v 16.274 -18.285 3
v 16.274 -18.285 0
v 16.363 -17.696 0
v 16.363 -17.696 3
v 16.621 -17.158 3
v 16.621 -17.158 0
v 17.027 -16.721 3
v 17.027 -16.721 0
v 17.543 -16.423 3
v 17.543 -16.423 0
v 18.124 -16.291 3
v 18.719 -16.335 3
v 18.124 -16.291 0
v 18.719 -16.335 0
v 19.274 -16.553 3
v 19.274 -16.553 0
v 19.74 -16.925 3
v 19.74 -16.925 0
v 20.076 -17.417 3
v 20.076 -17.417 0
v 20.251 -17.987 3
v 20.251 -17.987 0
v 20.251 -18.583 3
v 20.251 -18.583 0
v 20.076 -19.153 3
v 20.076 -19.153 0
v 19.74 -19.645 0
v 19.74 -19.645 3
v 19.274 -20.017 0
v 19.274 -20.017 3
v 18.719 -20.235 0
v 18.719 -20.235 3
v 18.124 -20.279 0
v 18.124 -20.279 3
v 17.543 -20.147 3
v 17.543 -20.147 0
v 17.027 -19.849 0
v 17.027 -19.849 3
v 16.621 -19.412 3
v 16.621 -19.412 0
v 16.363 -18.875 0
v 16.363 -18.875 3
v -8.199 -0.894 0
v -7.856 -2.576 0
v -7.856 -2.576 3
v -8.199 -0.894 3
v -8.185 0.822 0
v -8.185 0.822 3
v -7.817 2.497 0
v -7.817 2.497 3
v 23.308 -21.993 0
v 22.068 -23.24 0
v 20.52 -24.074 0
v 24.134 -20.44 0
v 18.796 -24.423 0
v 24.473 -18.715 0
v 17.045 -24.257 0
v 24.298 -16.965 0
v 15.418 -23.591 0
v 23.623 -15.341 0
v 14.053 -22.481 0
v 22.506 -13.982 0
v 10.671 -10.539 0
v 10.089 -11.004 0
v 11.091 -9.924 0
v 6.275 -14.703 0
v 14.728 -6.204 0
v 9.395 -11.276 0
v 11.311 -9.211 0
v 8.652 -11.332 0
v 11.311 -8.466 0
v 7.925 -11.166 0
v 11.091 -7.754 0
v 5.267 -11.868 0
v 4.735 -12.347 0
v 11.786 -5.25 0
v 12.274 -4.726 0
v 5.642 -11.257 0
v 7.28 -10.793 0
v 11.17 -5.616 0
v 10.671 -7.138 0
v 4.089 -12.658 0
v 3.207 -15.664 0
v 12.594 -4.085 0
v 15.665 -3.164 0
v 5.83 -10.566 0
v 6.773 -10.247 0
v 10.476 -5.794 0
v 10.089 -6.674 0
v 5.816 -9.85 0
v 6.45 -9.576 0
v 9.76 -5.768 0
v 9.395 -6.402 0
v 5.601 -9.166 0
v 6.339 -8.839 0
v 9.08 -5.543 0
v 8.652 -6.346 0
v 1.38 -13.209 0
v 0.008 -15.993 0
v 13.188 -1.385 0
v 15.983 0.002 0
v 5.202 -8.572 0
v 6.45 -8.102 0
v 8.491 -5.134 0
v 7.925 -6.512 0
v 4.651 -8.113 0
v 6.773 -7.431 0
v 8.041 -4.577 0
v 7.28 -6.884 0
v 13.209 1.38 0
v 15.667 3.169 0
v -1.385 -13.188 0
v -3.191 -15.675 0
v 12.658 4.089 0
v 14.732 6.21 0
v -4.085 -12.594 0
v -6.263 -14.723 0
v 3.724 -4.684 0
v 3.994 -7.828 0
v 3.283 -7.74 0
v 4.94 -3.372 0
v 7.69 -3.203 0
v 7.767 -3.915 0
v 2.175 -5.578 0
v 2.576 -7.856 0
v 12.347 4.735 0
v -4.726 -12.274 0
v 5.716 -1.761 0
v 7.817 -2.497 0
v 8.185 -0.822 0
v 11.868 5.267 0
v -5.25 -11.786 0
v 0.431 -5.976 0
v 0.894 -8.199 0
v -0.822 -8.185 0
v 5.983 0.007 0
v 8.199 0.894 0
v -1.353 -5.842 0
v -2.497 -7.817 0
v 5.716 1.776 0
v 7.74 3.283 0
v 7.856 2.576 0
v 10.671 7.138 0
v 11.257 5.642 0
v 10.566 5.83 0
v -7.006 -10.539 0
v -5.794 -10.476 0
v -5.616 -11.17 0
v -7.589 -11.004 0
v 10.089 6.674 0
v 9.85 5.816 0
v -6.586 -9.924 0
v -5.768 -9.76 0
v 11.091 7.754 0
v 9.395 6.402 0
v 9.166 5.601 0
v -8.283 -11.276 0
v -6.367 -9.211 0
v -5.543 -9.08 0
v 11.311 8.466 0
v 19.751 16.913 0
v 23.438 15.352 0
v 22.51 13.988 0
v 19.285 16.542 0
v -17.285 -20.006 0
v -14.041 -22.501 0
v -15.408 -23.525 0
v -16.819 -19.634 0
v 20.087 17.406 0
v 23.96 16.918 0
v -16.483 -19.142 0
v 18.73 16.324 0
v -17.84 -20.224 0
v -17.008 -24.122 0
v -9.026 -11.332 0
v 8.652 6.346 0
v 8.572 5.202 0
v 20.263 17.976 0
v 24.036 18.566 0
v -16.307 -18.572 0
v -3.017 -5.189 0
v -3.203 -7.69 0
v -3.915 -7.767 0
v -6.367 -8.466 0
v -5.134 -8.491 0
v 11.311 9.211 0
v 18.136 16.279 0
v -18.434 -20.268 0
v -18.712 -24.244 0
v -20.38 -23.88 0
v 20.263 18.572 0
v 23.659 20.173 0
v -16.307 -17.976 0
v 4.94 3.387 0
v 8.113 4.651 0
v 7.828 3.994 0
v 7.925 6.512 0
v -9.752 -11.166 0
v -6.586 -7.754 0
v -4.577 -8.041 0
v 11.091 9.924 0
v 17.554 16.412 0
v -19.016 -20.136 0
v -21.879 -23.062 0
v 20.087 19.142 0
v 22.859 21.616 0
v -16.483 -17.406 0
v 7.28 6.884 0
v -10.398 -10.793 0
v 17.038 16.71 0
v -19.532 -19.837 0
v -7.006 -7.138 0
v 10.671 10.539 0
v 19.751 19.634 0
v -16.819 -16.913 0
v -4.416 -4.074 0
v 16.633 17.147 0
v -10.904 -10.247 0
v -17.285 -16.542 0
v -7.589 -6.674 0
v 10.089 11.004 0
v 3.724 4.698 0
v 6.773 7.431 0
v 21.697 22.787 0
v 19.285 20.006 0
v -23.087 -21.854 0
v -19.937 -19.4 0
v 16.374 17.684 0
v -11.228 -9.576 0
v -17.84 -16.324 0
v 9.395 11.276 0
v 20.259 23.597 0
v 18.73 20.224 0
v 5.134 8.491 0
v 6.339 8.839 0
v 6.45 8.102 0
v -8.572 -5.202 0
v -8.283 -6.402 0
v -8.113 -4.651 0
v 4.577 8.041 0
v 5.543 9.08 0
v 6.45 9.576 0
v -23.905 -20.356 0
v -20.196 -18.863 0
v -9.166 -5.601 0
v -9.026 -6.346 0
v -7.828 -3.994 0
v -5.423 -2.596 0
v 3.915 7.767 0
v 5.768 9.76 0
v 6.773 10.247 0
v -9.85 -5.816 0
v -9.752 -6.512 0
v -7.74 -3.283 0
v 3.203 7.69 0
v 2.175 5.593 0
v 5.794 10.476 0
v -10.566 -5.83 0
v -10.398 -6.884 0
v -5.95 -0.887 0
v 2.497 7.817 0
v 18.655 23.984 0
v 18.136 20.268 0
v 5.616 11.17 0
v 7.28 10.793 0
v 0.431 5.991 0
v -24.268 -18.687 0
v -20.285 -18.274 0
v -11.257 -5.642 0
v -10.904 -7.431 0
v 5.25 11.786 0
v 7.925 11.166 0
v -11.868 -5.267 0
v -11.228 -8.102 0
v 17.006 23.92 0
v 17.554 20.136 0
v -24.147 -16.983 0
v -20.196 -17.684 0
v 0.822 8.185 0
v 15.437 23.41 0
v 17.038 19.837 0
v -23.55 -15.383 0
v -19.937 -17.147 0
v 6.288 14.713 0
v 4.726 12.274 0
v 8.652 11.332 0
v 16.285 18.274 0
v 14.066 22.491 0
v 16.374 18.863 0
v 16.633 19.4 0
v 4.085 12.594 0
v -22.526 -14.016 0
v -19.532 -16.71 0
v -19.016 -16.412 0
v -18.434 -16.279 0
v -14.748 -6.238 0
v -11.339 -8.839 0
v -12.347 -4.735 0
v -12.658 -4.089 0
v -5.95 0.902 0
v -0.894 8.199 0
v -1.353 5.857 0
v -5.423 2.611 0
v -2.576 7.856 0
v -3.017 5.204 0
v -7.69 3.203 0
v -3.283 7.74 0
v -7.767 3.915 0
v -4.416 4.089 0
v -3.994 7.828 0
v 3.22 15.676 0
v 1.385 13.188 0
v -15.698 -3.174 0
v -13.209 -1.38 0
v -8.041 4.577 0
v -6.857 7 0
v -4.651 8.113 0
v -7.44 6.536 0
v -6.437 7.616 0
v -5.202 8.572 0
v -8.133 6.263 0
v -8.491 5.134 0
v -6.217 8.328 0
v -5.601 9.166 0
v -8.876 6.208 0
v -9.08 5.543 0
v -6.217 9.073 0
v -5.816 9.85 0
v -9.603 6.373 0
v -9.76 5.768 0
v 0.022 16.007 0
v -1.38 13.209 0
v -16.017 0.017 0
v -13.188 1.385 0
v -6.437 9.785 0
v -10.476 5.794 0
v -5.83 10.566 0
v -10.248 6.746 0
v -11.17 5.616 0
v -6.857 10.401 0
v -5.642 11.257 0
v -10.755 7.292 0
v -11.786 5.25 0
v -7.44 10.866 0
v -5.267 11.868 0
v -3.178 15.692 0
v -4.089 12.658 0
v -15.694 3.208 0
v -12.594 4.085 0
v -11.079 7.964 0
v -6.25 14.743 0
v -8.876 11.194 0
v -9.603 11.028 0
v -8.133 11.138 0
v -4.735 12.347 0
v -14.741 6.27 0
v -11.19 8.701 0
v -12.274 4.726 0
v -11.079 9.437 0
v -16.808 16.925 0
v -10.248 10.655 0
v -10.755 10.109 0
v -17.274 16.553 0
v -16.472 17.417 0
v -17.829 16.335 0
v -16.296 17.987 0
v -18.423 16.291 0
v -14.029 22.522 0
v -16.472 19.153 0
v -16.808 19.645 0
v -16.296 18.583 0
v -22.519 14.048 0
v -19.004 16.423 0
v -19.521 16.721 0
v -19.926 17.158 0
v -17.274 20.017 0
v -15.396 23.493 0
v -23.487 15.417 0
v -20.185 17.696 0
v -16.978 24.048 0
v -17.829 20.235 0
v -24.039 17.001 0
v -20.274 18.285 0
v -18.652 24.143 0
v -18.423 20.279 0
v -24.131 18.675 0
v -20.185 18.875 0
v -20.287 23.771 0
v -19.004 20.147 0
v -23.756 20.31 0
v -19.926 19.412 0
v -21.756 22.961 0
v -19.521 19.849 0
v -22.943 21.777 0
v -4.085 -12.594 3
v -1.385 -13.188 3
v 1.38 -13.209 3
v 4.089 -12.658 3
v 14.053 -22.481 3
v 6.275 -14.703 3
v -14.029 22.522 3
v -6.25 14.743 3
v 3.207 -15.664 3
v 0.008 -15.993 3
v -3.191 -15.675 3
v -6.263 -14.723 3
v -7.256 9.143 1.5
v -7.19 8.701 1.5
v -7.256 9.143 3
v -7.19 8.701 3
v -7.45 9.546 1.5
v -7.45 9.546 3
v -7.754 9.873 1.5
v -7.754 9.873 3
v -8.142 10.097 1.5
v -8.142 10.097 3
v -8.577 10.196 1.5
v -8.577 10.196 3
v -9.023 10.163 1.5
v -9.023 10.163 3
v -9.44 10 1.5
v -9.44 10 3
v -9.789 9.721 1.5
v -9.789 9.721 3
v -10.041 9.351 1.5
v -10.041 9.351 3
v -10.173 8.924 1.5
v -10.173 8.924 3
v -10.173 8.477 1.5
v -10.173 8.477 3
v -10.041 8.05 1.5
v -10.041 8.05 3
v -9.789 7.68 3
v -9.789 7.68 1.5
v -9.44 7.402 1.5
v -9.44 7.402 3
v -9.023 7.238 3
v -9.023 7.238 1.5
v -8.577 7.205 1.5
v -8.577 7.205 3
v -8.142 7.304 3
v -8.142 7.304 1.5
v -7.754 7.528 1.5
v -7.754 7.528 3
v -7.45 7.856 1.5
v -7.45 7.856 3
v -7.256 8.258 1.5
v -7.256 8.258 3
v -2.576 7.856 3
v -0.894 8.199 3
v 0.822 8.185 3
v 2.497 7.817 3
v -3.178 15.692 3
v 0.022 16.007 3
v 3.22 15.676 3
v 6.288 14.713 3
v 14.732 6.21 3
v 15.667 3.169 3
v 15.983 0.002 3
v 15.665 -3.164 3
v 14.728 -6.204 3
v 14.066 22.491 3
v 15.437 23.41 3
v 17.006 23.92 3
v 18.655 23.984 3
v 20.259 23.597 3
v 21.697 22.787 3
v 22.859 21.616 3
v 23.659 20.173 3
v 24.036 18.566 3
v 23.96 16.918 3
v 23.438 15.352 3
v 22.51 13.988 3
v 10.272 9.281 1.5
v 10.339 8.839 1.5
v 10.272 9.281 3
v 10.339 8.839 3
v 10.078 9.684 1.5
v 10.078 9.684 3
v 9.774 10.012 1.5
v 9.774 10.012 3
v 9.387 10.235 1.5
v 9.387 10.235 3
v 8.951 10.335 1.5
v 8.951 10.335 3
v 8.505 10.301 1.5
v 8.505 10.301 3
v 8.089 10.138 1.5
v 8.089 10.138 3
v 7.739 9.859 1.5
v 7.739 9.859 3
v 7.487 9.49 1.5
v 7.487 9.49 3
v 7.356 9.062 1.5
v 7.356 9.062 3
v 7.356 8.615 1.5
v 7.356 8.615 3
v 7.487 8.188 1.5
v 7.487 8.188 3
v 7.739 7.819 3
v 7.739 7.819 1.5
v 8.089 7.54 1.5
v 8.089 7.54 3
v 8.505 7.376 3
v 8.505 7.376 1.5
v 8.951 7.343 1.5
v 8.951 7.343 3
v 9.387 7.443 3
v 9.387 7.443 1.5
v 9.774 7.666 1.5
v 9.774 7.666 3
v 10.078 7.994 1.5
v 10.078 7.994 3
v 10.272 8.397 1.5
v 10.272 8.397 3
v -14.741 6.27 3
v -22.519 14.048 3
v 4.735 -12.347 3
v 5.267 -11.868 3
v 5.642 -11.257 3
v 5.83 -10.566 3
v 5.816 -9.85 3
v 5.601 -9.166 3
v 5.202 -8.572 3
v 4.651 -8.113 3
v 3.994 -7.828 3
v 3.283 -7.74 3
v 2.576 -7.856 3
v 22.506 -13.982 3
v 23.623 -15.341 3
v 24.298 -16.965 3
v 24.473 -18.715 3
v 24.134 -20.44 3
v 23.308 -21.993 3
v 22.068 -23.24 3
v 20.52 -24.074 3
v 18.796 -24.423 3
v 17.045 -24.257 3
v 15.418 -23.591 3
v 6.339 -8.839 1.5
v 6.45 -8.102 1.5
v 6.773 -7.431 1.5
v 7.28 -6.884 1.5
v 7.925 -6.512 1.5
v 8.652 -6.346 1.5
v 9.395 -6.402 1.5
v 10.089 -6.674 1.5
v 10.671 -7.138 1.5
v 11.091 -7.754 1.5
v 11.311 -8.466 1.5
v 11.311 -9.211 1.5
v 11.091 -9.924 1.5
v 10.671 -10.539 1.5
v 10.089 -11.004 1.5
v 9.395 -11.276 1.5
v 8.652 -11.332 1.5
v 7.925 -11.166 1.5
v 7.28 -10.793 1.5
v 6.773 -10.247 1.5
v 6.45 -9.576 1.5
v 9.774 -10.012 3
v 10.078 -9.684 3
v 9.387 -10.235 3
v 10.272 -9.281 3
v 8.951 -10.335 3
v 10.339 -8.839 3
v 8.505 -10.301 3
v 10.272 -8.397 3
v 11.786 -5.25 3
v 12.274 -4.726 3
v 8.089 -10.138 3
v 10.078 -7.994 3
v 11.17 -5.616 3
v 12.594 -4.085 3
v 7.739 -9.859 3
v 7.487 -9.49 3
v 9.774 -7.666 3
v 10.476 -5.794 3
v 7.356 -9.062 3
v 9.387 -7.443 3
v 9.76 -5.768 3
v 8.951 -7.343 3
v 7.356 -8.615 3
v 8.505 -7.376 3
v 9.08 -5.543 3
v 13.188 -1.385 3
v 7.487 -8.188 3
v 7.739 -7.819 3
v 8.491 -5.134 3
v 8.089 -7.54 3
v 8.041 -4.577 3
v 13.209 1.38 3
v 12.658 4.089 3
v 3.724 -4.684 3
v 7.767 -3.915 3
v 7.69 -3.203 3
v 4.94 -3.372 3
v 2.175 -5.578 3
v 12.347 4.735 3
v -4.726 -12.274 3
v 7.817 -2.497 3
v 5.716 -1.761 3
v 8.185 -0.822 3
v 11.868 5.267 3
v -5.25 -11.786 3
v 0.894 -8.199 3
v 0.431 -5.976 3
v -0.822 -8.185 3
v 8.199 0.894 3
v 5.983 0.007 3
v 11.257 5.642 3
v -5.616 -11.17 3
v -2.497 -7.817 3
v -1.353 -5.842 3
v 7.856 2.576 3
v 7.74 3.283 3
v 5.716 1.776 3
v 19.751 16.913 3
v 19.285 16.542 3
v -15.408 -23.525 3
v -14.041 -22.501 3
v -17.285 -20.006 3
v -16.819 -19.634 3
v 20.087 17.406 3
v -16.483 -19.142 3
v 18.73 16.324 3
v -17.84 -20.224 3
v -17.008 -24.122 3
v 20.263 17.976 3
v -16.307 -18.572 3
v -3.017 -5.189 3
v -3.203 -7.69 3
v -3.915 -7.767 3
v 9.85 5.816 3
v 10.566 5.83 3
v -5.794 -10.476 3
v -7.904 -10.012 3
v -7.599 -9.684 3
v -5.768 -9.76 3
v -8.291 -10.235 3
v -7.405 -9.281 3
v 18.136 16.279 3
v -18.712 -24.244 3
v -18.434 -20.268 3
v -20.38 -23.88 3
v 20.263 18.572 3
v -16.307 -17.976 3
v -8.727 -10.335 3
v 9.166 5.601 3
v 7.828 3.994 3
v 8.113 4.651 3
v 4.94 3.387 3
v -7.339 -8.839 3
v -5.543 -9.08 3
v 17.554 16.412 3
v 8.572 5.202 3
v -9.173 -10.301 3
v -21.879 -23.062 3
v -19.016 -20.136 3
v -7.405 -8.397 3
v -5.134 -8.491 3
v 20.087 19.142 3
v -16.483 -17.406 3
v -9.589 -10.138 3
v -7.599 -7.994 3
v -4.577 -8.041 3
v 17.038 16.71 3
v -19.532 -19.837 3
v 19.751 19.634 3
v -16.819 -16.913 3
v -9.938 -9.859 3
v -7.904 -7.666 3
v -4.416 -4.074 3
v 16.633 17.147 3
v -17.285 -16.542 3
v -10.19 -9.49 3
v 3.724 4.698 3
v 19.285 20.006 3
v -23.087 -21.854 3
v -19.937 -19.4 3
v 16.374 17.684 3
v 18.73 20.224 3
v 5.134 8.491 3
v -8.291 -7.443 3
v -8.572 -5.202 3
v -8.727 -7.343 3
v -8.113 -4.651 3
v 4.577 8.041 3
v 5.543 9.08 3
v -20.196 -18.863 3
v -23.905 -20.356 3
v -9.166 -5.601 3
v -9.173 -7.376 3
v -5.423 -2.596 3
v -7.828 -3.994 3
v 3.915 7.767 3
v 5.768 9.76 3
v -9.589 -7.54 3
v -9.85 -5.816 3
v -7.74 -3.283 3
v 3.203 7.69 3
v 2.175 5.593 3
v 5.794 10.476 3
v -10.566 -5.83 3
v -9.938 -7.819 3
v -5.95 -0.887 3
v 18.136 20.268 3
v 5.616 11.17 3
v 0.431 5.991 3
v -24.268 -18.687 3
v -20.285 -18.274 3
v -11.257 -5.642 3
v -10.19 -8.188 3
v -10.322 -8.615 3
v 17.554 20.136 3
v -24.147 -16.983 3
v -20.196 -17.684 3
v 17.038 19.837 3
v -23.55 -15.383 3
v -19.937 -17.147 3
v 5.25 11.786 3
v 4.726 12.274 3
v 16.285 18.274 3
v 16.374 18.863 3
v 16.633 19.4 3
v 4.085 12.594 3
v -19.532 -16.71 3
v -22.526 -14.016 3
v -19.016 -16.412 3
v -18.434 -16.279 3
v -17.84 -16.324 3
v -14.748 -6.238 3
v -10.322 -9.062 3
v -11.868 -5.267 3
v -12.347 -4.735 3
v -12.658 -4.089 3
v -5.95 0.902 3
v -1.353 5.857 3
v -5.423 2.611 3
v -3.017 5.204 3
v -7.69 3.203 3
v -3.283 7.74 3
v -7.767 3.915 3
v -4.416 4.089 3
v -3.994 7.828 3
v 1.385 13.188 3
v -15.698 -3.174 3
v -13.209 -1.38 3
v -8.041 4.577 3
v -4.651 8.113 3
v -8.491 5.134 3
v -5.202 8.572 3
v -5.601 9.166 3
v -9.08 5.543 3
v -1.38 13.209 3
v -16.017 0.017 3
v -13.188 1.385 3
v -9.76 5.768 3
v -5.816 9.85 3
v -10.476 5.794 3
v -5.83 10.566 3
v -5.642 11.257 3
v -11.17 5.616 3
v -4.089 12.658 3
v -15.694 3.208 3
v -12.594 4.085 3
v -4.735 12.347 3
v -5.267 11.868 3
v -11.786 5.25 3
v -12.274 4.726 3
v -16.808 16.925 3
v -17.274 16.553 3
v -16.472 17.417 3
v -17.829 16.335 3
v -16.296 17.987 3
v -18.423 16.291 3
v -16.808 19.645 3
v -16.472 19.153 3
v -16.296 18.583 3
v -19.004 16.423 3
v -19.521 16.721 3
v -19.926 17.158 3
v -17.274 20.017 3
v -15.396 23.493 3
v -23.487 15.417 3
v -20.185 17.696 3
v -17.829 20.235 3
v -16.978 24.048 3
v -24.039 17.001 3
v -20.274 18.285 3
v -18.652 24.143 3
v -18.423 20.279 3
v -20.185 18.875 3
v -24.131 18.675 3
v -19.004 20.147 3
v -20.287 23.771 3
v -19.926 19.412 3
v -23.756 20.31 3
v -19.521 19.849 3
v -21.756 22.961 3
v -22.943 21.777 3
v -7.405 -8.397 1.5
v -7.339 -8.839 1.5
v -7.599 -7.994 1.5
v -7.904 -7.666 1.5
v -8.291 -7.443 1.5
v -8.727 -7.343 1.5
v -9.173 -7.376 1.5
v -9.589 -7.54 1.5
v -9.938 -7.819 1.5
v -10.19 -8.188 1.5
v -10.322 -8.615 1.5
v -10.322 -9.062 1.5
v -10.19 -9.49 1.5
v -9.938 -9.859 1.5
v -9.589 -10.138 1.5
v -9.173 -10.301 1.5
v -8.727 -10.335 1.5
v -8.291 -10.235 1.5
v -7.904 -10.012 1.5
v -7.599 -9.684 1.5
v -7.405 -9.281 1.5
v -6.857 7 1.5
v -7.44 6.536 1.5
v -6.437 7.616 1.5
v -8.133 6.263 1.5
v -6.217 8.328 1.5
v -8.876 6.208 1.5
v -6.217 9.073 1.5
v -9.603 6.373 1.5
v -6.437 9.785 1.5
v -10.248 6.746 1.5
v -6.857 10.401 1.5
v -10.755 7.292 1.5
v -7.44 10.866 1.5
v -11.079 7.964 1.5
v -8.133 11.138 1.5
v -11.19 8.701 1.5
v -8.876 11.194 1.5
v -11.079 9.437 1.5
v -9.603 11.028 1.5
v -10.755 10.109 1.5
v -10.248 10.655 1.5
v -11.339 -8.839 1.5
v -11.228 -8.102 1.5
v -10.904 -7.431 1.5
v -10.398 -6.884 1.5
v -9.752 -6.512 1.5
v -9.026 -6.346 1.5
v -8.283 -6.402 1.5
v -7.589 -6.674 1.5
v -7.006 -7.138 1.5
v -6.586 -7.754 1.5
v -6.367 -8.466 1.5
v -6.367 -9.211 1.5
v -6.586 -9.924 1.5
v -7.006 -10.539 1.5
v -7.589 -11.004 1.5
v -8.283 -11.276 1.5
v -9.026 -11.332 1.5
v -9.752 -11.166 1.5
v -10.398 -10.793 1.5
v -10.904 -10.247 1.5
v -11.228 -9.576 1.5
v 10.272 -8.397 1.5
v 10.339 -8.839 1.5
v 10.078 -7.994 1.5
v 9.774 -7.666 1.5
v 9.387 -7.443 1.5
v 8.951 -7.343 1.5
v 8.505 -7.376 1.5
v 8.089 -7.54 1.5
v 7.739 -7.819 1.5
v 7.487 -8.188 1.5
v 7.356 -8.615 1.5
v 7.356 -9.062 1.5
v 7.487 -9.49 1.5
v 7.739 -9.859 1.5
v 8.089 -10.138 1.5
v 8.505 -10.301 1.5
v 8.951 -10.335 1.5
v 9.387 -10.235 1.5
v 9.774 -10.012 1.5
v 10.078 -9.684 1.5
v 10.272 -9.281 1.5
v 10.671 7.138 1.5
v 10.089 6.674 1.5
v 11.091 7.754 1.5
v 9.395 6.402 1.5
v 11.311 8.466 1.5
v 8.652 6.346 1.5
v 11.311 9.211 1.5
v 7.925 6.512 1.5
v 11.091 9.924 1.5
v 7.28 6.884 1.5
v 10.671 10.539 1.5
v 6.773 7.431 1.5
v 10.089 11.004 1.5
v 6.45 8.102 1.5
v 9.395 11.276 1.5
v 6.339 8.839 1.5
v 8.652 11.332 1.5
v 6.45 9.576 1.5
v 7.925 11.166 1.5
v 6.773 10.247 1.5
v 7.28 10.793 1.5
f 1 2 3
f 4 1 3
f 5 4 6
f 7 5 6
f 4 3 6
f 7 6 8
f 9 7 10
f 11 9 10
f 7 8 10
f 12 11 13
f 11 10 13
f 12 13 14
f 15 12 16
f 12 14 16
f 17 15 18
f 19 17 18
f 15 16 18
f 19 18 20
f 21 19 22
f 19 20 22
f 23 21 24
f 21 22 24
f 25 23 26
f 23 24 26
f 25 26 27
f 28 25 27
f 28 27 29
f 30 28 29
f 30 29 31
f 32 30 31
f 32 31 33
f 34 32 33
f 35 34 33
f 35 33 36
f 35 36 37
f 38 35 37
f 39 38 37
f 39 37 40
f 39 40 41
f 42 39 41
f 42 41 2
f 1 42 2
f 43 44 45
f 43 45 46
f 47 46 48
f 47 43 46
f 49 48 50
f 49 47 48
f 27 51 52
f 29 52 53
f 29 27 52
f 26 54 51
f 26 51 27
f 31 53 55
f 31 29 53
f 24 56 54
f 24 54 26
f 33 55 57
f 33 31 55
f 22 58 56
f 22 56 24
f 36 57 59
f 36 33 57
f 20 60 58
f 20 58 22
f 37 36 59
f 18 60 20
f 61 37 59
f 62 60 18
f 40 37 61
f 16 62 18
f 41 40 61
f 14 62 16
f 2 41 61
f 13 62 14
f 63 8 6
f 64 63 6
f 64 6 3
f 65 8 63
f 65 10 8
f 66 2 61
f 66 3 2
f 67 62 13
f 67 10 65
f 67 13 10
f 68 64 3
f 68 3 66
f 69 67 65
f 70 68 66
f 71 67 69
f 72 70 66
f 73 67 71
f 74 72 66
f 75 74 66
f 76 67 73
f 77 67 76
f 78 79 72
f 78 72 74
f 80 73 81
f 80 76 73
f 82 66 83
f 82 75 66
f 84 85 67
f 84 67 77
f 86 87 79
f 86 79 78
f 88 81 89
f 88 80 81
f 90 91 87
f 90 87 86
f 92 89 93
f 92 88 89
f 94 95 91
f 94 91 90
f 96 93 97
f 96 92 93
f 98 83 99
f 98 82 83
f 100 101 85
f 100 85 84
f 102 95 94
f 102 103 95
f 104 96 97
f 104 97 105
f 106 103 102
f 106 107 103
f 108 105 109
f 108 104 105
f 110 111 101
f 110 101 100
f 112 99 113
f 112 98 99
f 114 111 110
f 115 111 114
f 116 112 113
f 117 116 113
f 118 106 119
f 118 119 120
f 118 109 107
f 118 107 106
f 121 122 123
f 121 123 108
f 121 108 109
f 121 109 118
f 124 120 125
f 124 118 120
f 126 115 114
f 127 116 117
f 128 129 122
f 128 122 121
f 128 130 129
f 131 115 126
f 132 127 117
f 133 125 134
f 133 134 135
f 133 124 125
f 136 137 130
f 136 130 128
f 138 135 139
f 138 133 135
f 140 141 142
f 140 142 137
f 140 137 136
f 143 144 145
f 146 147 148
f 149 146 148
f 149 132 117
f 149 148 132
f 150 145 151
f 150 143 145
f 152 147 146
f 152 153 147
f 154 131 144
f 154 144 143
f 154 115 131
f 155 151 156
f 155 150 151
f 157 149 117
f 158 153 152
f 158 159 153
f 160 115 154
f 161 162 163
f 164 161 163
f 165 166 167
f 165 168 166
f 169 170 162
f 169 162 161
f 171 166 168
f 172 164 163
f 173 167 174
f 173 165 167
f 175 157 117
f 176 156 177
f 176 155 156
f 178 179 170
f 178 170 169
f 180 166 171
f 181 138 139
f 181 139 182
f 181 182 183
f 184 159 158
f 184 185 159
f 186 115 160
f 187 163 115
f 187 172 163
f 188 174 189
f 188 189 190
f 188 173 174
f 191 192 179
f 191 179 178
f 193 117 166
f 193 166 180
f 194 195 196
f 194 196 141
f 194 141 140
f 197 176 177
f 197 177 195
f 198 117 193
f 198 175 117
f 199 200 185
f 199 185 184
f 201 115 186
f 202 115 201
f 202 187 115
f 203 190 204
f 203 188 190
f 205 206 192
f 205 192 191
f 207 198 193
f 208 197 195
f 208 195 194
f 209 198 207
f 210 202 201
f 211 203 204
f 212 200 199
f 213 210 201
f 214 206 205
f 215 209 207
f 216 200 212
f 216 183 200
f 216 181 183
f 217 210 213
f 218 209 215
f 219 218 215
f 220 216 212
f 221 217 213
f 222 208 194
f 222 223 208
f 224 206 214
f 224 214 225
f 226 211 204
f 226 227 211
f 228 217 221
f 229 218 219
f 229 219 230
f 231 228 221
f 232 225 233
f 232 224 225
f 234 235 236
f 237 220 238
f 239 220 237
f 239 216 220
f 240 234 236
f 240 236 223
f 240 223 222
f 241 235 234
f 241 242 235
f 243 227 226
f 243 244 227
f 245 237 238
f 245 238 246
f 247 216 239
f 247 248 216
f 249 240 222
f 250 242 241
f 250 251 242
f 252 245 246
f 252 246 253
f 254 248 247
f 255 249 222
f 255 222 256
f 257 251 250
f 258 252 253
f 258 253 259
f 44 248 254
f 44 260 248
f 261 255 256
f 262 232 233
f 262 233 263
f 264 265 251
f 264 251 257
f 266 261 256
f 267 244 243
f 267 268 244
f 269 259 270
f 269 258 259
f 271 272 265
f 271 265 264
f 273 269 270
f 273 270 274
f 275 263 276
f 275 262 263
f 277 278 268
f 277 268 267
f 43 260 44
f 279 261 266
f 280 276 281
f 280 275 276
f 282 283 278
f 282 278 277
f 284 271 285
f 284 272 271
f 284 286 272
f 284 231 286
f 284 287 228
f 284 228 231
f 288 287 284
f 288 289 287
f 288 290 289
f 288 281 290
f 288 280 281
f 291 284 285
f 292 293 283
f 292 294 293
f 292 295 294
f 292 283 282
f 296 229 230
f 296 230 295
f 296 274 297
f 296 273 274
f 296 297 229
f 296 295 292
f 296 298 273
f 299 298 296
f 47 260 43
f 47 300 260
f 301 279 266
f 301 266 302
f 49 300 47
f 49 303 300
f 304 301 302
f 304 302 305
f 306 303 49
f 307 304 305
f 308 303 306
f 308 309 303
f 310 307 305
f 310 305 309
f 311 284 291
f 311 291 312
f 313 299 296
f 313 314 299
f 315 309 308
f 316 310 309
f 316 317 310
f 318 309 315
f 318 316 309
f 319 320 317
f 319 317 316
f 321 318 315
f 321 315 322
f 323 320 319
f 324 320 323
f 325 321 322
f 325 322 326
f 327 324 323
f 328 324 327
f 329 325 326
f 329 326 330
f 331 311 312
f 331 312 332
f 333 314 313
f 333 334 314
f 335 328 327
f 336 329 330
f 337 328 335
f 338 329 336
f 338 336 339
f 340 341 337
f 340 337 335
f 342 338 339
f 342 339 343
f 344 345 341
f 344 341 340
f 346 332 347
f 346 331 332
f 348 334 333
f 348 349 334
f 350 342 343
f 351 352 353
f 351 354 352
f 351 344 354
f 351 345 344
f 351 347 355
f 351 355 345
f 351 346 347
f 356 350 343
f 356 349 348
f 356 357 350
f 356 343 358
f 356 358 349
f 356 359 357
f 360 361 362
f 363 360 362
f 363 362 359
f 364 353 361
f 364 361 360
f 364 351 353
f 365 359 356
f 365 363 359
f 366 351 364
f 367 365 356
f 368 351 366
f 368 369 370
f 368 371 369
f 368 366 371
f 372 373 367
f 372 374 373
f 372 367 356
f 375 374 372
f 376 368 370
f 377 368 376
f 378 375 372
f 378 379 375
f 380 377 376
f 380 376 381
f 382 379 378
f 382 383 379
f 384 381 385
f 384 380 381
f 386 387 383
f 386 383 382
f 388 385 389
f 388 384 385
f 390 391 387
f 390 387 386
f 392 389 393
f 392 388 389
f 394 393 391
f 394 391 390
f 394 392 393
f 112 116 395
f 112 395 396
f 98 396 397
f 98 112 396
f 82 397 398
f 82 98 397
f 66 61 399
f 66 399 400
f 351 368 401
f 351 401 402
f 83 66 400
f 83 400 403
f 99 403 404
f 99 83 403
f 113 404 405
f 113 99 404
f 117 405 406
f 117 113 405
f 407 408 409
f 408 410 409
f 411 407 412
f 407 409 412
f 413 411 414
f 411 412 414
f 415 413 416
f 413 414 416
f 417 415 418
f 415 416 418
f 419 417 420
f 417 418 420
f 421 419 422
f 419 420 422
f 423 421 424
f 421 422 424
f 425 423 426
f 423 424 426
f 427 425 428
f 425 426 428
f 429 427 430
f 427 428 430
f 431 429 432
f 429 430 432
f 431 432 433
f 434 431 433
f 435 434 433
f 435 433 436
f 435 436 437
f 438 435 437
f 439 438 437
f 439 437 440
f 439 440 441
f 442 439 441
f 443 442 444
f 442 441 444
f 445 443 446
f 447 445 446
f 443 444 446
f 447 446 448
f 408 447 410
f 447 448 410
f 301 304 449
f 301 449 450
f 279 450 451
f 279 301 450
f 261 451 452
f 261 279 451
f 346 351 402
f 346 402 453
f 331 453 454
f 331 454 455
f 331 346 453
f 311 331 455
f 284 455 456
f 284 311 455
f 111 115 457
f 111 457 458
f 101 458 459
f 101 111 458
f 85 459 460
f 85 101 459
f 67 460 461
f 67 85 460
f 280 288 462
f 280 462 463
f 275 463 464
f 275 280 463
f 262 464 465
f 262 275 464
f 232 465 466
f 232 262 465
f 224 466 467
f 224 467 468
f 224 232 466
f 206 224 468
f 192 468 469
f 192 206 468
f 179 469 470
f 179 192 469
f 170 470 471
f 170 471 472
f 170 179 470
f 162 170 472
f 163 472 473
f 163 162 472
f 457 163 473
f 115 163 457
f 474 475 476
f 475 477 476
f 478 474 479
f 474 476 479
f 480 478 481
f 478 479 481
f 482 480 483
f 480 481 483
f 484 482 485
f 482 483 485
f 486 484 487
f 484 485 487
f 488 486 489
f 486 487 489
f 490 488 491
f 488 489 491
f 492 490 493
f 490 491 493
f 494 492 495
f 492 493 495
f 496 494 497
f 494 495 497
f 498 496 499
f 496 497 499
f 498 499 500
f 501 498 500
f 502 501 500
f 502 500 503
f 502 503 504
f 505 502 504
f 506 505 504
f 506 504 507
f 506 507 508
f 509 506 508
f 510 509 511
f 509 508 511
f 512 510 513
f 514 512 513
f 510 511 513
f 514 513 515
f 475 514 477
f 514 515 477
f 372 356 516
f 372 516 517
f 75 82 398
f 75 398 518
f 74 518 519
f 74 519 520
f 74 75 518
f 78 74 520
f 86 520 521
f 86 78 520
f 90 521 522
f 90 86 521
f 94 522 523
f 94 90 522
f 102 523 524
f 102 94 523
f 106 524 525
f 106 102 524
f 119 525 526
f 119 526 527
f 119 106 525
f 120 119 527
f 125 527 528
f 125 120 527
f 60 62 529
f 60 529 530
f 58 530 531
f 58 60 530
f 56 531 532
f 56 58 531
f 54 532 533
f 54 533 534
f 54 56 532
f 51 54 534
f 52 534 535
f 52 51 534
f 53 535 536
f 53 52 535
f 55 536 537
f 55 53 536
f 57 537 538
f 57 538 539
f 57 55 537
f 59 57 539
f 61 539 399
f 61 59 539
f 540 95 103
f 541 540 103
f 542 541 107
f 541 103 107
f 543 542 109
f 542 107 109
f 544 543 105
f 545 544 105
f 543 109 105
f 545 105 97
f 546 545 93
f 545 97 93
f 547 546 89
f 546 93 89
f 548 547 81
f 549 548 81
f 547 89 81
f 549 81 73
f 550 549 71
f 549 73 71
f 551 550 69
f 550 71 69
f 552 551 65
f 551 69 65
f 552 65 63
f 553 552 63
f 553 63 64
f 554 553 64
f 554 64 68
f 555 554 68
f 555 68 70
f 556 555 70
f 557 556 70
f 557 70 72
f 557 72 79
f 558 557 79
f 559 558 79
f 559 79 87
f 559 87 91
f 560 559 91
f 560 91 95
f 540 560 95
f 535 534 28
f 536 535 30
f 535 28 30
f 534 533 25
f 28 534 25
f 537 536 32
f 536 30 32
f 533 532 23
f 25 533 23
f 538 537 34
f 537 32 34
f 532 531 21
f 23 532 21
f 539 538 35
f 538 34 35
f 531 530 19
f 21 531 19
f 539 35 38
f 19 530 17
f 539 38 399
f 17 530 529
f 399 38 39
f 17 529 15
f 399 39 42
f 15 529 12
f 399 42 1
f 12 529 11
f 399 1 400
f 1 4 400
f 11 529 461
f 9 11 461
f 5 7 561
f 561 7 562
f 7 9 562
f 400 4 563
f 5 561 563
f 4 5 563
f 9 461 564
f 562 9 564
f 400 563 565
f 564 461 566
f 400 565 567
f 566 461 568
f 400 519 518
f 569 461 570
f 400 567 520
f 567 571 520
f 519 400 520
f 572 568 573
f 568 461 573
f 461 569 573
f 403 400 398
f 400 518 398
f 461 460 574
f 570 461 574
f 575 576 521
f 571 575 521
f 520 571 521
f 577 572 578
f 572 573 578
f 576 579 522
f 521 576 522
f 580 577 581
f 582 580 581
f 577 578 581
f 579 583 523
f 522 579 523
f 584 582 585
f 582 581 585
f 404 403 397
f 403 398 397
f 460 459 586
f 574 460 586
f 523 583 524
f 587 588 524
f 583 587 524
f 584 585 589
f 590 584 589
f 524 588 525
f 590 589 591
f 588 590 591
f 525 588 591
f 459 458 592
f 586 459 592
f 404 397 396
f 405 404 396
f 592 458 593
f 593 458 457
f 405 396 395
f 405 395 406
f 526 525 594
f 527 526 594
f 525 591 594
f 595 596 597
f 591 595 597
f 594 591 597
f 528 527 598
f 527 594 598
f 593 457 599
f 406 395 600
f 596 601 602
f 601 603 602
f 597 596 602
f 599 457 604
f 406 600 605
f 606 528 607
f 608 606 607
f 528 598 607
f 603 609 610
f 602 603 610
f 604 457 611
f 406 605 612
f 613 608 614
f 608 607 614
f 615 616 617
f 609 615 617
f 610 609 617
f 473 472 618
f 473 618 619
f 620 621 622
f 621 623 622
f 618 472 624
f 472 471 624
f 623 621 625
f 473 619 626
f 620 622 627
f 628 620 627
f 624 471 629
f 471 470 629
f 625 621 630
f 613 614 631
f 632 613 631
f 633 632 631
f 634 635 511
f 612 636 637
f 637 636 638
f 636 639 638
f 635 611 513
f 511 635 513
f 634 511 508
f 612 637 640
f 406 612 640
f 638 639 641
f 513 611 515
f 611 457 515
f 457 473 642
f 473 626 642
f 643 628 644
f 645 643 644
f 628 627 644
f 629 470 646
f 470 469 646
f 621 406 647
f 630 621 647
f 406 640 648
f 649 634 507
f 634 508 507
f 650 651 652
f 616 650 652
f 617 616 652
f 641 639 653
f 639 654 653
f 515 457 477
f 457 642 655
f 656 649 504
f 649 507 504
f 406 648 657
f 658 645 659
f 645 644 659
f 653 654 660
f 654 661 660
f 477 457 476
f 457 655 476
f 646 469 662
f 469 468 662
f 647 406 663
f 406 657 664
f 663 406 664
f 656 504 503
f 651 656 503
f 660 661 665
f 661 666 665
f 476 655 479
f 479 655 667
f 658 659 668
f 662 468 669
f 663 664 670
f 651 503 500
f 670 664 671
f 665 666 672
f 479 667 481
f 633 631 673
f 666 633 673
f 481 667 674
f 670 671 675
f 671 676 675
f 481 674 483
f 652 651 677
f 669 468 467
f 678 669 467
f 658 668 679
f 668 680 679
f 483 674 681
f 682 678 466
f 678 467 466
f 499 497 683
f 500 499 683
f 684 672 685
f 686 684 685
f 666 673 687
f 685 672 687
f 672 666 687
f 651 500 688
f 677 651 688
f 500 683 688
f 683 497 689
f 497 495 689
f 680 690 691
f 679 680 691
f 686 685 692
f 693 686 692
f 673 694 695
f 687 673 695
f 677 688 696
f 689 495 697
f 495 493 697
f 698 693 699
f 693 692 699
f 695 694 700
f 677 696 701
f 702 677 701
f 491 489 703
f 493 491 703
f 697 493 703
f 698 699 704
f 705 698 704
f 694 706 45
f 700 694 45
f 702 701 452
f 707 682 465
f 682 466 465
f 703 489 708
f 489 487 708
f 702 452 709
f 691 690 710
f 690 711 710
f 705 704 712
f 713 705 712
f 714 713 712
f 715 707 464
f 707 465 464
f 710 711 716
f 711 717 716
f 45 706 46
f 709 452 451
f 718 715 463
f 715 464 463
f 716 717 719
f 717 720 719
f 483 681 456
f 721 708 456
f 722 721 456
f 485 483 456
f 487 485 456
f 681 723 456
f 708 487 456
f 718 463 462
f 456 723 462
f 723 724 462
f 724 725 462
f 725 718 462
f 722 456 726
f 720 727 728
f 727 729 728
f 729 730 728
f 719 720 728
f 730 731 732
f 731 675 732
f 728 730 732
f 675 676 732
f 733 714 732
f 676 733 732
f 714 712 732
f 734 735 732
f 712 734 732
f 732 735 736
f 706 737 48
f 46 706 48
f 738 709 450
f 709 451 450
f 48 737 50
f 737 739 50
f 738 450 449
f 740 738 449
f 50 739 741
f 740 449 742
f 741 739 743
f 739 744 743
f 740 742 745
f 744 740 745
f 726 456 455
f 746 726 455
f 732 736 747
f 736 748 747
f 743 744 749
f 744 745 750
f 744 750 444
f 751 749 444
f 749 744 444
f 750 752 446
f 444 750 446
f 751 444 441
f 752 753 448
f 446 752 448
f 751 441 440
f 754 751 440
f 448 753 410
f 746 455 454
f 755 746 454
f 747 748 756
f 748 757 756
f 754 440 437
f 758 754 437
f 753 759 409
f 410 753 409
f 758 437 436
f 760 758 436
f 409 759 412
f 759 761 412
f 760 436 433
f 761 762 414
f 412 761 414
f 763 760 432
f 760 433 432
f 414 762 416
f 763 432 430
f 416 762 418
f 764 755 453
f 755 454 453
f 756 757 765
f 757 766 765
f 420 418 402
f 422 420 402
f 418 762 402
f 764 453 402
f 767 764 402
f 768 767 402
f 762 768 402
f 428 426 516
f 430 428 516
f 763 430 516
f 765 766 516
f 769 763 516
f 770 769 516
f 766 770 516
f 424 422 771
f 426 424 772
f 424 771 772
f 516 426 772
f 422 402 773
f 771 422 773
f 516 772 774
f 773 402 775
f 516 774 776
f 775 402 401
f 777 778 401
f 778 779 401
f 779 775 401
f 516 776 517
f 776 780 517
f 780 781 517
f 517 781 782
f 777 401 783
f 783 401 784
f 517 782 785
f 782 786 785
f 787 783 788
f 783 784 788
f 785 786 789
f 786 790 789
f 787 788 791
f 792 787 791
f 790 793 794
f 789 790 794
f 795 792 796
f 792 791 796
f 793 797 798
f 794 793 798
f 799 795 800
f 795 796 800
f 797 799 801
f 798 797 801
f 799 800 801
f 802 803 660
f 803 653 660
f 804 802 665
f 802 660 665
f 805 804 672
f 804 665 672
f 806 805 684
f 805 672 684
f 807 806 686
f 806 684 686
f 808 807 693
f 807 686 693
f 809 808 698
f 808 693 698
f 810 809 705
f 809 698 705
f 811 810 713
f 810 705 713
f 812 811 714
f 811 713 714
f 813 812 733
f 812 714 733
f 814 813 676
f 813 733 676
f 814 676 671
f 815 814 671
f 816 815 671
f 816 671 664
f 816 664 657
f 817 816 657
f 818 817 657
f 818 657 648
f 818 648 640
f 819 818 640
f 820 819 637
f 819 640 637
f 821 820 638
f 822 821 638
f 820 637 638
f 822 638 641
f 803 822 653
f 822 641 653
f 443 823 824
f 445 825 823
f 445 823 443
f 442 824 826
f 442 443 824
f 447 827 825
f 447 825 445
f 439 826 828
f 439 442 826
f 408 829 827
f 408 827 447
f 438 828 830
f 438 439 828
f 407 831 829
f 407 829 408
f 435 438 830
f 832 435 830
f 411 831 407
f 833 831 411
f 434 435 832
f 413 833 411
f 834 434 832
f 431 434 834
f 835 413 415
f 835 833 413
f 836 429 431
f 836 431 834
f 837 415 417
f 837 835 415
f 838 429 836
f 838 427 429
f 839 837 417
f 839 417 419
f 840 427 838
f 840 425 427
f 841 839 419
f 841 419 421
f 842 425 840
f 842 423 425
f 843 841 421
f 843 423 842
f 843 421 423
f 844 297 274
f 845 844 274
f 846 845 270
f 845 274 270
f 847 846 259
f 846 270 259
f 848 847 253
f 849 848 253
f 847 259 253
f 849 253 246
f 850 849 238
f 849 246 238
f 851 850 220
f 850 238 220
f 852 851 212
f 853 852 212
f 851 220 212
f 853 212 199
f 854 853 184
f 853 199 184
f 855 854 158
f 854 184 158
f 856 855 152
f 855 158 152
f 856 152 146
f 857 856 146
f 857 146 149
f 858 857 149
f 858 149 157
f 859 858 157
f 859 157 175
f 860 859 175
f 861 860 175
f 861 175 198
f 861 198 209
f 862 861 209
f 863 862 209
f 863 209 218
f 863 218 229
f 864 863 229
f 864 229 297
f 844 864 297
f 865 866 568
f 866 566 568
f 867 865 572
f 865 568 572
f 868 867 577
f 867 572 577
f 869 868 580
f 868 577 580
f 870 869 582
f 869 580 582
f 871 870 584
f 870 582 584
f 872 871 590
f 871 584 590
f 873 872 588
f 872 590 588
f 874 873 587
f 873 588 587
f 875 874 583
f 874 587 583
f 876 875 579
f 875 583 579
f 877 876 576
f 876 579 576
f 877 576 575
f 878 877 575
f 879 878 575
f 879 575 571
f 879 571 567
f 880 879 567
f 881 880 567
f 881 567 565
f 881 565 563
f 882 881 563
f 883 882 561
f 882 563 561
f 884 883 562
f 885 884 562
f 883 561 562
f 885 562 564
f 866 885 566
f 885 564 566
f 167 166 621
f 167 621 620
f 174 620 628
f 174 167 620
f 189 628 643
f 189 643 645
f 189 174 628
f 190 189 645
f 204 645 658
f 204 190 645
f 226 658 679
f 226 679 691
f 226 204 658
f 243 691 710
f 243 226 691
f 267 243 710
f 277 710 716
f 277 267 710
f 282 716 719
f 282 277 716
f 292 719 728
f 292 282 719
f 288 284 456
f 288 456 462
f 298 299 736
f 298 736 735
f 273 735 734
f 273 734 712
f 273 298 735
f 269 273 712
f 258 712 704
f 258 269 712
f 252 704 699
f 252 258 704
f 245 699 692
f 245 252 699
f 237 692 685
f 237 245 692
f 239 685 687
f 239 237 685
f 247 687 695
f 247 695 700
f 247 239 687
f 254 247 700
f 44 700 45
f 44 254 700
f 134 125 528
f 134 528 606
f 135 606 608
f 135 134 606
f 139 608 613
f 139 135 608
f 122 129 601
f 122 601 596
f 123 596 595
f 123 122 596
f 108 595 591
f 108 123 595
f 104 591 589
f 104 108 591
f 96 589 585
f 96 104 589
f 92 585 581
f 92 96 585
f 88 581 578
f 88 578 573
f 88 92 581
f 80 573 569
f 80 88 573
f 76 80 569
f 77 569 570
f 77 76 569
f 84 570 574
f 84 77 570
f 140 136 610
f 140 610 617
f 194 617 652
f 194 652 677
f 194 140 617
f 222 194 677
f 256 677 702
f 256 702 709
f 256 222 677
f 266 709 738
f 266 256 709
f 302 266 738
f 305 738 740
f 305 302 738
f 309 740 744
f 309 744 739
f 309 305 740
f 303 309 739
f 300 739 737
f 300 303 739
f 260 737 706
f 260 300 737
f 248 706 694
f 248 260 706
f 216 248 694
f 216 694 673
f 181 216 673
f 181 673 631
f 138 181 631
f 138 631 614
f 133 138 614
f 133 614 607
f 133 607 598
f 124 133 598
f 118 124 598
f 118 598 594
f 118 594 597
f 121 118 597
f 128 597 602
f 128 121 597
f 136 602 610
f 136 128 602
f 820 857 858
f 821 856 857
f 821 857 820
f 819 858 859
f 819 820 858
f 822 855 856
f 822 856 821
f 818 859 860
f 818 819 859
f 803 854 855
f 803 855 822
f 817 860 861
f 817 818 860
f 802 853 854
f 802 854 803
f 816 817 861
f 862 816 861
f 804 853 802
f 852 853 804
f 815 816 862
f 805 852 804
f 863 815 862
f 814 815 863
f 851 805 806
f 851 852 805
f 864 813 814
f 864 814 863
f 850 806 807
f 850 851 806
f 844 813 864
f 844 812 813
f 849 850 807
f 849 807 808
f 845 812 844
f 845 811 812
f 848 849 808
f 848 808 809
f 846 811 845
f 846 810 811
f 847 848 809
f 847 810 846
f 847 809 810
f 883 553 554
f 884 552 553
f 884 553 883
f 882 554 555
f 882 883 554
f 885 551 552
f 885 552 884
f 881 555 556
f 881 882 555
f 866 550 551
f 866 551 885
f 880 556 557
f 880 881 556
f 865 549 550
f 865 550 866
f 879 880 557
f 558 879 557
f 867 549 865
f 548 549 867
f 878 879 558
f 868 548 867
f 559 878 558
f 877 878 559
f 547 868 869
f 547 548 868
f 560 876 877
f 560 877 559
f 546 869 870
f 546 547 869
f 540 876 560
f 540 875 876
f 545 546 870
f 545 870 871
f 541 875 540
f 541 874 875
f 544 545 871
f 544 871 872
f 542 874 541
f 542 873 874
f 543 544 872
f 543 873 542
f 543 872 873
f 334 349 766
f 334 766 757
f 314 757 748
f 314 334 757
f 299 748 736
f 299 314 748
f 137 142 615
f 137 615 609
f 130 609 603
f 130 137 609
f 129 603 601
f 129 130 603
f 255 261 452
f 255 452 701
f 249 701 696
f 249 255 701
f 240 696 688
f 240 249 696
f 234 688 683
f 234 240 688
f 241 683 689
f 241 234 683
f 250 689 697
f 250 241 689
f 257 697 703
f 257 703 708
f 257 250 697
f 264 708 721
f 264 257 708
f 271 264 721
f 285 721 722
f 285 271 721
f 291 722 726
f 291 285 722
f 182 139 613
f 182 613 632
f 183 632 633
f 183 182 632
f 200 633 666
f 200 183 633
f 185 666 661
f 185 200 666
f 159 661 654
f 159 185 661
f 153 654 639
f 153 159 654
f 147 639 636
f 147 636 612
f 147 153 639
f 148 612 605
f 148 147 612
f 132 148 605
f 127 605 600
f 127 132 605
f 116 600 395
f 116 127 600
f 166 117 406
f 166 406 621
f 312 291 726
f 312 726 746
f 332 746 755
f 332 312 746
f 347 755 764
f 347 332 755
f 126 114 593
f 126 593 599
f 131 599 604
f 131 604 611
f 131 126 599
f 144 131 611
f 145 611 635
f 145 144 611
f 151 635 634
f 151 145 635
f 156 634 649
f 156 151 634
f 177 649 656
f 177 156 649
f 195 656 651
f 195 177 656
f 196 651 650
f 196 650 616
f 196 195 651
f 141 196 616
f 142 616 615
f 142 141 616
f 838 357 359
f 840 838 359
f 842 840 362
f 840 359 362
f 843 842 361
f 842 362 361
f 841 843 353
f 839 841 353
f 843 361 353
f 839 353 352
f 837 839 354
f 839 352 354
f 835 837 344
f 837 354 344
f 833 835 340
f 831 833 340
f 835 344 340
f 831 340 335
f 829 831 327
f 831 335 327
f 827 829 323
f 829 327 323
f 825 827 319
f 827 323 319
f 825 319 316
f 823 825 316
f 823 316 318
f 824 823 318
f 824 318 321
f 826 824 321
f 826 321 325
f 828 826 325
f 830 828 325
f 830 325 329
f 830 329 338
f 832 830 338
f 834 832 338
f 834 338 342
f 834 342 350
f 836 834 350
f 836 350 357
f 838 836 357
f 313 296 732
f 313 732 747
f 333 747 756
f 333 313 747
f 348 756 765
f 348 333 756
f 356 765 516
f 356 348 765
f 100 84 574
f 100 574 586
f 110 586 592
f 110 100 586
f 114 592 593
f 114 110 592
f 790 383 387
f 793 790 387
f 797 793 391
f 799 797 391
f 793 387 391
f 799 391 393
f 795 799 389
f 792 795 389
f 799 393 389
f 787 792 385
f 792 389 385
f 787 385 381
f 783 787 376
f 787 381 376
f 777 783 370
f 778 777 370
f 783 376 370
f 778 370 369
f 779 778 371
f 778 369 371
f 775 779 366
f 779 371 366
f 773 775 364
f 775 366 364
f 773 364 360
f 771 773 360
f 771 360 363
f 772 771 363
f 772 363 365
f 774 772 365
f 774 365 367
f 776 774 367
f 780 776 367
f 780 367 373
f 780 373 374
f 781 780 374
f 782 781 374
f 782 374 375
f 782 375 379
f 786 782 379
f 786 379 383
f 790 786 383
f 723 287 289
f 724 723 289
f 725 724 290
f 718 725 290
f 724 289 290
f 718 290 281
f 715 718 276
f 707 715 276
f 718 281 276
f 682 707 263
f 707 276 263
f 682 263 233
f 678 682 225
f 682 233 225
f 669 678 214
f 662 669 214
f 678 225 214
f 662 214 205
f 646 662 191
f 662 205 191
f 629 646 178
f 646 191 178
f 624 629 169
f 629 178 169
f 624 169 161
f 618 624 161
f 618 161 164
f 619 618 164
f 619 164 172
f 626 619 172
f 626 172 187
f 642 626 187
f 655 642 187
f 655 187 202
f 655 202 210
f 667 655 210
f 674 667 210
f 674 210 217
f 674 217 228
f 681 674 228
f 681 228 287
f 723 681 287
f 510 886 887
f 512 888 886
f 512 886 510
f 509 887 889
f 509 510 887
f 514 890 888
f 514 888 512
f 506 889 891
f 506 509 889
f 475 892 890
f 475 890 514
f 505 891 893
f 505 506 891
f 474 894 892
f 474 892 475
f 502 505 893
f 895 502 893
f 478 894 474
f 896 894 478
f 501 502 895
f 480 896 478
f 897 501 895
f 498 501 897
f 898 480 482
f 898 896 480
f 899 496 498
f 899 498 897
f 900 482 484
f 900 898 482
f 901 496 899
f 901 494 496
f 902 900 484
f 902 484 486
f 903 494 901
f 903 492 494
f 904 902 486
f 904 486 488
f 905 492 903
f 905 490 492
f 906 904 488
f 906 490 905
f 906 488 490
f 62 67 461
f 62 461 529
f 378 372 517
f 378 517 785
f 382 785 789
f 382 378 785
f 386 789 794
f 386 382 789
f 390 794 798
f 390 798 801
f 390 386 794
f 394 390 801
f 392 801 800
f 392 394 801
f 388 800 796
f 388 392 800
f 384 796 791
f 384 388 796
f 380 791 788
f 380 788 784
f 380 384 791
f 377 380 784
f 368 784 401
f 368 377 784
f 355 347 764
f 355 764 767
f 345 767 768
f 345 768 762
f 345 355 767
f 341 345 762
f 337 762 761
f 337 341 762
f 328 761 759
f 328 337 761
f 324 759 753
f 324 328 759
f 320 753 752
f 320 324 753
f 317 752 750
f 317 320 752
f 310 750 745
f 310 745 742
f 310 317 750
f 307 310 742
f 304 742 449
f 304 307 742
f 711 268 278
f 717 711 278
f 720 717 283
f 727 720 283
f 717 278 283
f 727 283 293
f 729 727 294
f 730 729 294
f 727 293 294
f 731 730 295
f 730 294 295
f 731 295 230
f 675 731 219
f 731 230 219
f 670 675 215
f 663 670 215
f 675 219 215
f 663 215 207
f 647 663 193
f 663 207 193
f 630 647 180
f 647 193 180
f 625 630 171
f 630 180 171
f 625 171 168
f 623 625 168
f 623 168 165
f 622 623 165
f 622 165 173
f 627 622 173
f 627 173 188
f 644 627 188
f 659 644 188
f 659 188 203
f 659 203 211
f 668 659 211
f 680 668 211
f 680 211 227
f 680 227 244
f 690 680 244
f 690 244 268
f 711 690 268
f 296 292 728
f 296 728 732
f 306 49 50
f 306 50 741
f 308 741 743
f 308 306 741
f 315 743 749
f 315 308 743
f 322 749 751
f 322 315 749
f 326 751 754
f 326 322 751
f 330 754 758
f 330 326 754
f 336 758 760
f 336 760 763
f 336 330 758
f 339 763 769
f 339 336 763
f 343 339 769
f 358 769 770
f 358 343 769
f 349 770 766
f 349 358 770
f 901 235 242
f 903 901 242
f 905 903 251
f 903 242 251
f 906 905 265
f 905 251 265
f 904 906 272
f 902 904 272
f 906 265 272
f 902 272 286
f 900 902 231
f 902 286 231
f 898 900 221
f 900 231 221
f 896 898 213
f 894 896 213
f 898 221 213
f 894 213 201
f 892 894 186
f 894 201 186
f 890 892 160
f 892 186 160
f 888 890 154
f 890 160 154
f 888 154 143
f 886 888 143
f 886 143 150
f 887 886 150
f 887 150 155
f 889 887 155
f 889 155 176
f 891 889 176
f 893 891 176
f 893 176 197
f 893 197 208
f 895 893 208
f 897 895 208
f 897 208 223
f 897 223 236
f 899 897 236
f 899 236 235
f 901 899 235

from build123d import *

# Parameters (mm, degrees)
ESBO_O1_R                                            = 6
RESSALTO_EXTRUS_O1_DEPTH                             = 3
REBAIXO_PARA_PARAFUSO_DE_M_QUINA_COM_CAB_D           = 3
REBAIXO_PARA_PARAFUSO_DE_M_QUINA_COM_CAB_CBORE_D     = 5
REBAIXO_PARA_PARAFUSO_DE_M_QUINA_COM_CAB_CBORE_DEPTH = 1.5
ESBO_O3_R                                            = 2
CORTE_EXTRUS_O1_DEPTH                                = 35.715241483


with BuildPart() as part:
    # Esboço1 → Ressalto-extrusão1 (new body)
    with BuildSketch(Plane.XY):
        with BuildLine():
            Line((22.509738768, 13.987877111), (14.731564175, 6.209702518))
            ThreePointArc((14.731564175, 6.209702518), (15.982587719, 0.002329667), (14.727577793, -6.204238442))
            Line((14.727577793, -6.204238442), (22.505752386, -13.982413035))
            ThreePointArc((22.505752386, -13.982413035), (22.734084307, -22.662243955), (14.053133017, -22.48145412))
            Line((14.053133017, -22.48145412), (6.274958424, -14.703279527))
            ThreePointArc((6.274958424, -14.703279527), (0.008088366, -15.99251207), (-6.26285925, -14.723261559))
            Line((-6.26285925, -14.723261559), (-14.041033843, -22.501436152))
            ThreePointArc((-14.041033843, -22.501436152), (-22.526315217, -22.501436152), (-22.526315217, -14.016154778))
            Line((-22.526315217, -14.016154778), (-14.748140624, -6.237980185))
            ThreePointArc((-14.748140624, -6.237980185), (-16.017408692, 0.016872321), (-14.740788367, 6.270228368))
            Line((-14.740788367, 6.270228368), (-22.51896296, 14.048402961))
            ThreePointArc((-22.51896296, 14.048402961), (-22.390928385, 22.410501827), (-14.028587912, 22.521641923))
            Line((-14.028587912, 22.521641923), (-6.250413319, 14.74346733))
            ThreePointArc((-6.250413319, 14.74346733), (0.022005702, 16.007419056), (6.288120931, 14.712577651))
            Line((6.288120931, 14.712577651), (14.066295524, 22.490752244))
            ThreePointArc((14.066295524, 22.490752244), (22.318505349, 22.241631288), (22.509738768, 13.987877111))
        make_face()
        with Locations((-0.017411456, 0.007467609)):
            Circle(ESBO_O1_R, mode=Mode.SUBTRACT)
        with BuildLine():
            ThreePointArc((4.084918003, 12.594218492), (0.002992983, 13.270918226), (-4.088943192, 12.657654219))
            ThreePointArc((-4.088943192, 12.657654219), (-5.733074845, 9.500414621), (-2.575835247, 7.856282968))
            ThreePointArc((-2.575835247, 7.856282968), (-0.036074884, 8.236920288), (2.497471811, 7.816910031))
            ThreePointArc((2.497471811, 7.816910031), (5.679849137, 9.411841166), (4.084918003, 12.594218492))
        make_face(mode=Mode.SUBTRACT)
        with BuildLine():
            ThreePointArc((12.594218492, -4.084918003), (13.270918226, -0.002992983), (12.657654219, 4.088943192))
            ThreePointArc((12.657654219, 4.088943192), (9.500414621, 5.733074845), (7.856282968, 2.575835247))
            ThreePointArc((7.856282968, 2.575835247), (8.236920288, 0.036074884), (7.816910031, -2.497471811))
            ThreePointArc((7.816910031, -2.497471811), (9.411841166, -5.679849137), (12.594218492, -4.084918003))
        make_face(mode=Mode.SUBTRACT)
        with BuildLine():
            ThreePointArc((-4.084918003, -12.594218492), (-0.002992983, -13.270918226), (4.088943192, -12.657654219))
            ThreePointArc((4.088943192, -12.657654219), (5.733074845, -9.500414621), (2.575835247, -7.856282968))
            ThreePointArc((2.575835247, -7.856282968), (0.036074884, -8.236920288), (-2.497471811, -7.816910031))
            ThreePointArc((-2.497471811, -7.816910031), (-5.679849137, -9.411841166), (-4.084918003, -12.594218492))
        make_face(mode=Mode.SUBTRACT)
        with BuildLine():
            ThreePointArc((-12.594218492, 4.084918003), (-13.270918226, 0.002992983), (-12.657654219, -4.088943192))
            ThreePointArc((-12.657654219, -4.088943192), (-9.500414621, -5.733074845), (-7.856282968, -2.575835247))
            ThreePointArc((-7.856282968, -2.575835247), (-8.236920288, -0.036074884), (-7.816910031, 2.497471811))
            ThreePointArc((-7.816910031, 2.497471811), (-9.411841166, 5.679849137), (-12.594218492, 4.084918003))
        make_face(mode=Mode.SUBTRACT)
    extrude(amount=RESSALTO_EXTRUS_O1_DEPTH)

    # Rebaixo para parafuso de máquina com cabeça panela de M22 (through all)
    with Locations(Plane(origin=(8.838834765, 8.838834765, 0), x_dir=(-1, 0, 0), z_dir=(0, 0, -1))):
        with Locations((0, 0), (17.528411311, -0.138256325), (17.67766953, -17.67766953), (0, -17.67766953)):
            CounterBoreHole(REBAIXO_PARA_PARAFUSO_DE_M_QUINA_COM_CAB_D / 2, REBAIXO_PARA_PARAFUSO_DE_M_QUINA_COM_CAB_CBORE_D / 2, REBAIXO_PARA_PARAFUSO_DE_M_QUINA_COM_CAB_CBORE_DEPTH)

    # Esboço3 → Corte-extrusão1 (cut, through all)
    with BuildSketch(Plane(origin=(0, 0, 0), x_dir=(-1, 0, 0), z_dir=(0, 0, -1))):
        with Locations((-18.285022442, 18.273775436)):
            Circle(ESBO_O3_R)
        with Locations((18.273775436, 18.285022442)):
            Circle(ESBO_O3_R)
        with Locations((18.285022442, -18.273775436)):
            Circle(ESBO_O3_R)
        with Locations((-18.273775436, -18.285022442)):
            Circle(ESBO_O3_R)
    extrude(amount=-CORTE_EXTRUS_O1_DEPTH, mode=Mode.SUBTRACT)


solid = part.part
